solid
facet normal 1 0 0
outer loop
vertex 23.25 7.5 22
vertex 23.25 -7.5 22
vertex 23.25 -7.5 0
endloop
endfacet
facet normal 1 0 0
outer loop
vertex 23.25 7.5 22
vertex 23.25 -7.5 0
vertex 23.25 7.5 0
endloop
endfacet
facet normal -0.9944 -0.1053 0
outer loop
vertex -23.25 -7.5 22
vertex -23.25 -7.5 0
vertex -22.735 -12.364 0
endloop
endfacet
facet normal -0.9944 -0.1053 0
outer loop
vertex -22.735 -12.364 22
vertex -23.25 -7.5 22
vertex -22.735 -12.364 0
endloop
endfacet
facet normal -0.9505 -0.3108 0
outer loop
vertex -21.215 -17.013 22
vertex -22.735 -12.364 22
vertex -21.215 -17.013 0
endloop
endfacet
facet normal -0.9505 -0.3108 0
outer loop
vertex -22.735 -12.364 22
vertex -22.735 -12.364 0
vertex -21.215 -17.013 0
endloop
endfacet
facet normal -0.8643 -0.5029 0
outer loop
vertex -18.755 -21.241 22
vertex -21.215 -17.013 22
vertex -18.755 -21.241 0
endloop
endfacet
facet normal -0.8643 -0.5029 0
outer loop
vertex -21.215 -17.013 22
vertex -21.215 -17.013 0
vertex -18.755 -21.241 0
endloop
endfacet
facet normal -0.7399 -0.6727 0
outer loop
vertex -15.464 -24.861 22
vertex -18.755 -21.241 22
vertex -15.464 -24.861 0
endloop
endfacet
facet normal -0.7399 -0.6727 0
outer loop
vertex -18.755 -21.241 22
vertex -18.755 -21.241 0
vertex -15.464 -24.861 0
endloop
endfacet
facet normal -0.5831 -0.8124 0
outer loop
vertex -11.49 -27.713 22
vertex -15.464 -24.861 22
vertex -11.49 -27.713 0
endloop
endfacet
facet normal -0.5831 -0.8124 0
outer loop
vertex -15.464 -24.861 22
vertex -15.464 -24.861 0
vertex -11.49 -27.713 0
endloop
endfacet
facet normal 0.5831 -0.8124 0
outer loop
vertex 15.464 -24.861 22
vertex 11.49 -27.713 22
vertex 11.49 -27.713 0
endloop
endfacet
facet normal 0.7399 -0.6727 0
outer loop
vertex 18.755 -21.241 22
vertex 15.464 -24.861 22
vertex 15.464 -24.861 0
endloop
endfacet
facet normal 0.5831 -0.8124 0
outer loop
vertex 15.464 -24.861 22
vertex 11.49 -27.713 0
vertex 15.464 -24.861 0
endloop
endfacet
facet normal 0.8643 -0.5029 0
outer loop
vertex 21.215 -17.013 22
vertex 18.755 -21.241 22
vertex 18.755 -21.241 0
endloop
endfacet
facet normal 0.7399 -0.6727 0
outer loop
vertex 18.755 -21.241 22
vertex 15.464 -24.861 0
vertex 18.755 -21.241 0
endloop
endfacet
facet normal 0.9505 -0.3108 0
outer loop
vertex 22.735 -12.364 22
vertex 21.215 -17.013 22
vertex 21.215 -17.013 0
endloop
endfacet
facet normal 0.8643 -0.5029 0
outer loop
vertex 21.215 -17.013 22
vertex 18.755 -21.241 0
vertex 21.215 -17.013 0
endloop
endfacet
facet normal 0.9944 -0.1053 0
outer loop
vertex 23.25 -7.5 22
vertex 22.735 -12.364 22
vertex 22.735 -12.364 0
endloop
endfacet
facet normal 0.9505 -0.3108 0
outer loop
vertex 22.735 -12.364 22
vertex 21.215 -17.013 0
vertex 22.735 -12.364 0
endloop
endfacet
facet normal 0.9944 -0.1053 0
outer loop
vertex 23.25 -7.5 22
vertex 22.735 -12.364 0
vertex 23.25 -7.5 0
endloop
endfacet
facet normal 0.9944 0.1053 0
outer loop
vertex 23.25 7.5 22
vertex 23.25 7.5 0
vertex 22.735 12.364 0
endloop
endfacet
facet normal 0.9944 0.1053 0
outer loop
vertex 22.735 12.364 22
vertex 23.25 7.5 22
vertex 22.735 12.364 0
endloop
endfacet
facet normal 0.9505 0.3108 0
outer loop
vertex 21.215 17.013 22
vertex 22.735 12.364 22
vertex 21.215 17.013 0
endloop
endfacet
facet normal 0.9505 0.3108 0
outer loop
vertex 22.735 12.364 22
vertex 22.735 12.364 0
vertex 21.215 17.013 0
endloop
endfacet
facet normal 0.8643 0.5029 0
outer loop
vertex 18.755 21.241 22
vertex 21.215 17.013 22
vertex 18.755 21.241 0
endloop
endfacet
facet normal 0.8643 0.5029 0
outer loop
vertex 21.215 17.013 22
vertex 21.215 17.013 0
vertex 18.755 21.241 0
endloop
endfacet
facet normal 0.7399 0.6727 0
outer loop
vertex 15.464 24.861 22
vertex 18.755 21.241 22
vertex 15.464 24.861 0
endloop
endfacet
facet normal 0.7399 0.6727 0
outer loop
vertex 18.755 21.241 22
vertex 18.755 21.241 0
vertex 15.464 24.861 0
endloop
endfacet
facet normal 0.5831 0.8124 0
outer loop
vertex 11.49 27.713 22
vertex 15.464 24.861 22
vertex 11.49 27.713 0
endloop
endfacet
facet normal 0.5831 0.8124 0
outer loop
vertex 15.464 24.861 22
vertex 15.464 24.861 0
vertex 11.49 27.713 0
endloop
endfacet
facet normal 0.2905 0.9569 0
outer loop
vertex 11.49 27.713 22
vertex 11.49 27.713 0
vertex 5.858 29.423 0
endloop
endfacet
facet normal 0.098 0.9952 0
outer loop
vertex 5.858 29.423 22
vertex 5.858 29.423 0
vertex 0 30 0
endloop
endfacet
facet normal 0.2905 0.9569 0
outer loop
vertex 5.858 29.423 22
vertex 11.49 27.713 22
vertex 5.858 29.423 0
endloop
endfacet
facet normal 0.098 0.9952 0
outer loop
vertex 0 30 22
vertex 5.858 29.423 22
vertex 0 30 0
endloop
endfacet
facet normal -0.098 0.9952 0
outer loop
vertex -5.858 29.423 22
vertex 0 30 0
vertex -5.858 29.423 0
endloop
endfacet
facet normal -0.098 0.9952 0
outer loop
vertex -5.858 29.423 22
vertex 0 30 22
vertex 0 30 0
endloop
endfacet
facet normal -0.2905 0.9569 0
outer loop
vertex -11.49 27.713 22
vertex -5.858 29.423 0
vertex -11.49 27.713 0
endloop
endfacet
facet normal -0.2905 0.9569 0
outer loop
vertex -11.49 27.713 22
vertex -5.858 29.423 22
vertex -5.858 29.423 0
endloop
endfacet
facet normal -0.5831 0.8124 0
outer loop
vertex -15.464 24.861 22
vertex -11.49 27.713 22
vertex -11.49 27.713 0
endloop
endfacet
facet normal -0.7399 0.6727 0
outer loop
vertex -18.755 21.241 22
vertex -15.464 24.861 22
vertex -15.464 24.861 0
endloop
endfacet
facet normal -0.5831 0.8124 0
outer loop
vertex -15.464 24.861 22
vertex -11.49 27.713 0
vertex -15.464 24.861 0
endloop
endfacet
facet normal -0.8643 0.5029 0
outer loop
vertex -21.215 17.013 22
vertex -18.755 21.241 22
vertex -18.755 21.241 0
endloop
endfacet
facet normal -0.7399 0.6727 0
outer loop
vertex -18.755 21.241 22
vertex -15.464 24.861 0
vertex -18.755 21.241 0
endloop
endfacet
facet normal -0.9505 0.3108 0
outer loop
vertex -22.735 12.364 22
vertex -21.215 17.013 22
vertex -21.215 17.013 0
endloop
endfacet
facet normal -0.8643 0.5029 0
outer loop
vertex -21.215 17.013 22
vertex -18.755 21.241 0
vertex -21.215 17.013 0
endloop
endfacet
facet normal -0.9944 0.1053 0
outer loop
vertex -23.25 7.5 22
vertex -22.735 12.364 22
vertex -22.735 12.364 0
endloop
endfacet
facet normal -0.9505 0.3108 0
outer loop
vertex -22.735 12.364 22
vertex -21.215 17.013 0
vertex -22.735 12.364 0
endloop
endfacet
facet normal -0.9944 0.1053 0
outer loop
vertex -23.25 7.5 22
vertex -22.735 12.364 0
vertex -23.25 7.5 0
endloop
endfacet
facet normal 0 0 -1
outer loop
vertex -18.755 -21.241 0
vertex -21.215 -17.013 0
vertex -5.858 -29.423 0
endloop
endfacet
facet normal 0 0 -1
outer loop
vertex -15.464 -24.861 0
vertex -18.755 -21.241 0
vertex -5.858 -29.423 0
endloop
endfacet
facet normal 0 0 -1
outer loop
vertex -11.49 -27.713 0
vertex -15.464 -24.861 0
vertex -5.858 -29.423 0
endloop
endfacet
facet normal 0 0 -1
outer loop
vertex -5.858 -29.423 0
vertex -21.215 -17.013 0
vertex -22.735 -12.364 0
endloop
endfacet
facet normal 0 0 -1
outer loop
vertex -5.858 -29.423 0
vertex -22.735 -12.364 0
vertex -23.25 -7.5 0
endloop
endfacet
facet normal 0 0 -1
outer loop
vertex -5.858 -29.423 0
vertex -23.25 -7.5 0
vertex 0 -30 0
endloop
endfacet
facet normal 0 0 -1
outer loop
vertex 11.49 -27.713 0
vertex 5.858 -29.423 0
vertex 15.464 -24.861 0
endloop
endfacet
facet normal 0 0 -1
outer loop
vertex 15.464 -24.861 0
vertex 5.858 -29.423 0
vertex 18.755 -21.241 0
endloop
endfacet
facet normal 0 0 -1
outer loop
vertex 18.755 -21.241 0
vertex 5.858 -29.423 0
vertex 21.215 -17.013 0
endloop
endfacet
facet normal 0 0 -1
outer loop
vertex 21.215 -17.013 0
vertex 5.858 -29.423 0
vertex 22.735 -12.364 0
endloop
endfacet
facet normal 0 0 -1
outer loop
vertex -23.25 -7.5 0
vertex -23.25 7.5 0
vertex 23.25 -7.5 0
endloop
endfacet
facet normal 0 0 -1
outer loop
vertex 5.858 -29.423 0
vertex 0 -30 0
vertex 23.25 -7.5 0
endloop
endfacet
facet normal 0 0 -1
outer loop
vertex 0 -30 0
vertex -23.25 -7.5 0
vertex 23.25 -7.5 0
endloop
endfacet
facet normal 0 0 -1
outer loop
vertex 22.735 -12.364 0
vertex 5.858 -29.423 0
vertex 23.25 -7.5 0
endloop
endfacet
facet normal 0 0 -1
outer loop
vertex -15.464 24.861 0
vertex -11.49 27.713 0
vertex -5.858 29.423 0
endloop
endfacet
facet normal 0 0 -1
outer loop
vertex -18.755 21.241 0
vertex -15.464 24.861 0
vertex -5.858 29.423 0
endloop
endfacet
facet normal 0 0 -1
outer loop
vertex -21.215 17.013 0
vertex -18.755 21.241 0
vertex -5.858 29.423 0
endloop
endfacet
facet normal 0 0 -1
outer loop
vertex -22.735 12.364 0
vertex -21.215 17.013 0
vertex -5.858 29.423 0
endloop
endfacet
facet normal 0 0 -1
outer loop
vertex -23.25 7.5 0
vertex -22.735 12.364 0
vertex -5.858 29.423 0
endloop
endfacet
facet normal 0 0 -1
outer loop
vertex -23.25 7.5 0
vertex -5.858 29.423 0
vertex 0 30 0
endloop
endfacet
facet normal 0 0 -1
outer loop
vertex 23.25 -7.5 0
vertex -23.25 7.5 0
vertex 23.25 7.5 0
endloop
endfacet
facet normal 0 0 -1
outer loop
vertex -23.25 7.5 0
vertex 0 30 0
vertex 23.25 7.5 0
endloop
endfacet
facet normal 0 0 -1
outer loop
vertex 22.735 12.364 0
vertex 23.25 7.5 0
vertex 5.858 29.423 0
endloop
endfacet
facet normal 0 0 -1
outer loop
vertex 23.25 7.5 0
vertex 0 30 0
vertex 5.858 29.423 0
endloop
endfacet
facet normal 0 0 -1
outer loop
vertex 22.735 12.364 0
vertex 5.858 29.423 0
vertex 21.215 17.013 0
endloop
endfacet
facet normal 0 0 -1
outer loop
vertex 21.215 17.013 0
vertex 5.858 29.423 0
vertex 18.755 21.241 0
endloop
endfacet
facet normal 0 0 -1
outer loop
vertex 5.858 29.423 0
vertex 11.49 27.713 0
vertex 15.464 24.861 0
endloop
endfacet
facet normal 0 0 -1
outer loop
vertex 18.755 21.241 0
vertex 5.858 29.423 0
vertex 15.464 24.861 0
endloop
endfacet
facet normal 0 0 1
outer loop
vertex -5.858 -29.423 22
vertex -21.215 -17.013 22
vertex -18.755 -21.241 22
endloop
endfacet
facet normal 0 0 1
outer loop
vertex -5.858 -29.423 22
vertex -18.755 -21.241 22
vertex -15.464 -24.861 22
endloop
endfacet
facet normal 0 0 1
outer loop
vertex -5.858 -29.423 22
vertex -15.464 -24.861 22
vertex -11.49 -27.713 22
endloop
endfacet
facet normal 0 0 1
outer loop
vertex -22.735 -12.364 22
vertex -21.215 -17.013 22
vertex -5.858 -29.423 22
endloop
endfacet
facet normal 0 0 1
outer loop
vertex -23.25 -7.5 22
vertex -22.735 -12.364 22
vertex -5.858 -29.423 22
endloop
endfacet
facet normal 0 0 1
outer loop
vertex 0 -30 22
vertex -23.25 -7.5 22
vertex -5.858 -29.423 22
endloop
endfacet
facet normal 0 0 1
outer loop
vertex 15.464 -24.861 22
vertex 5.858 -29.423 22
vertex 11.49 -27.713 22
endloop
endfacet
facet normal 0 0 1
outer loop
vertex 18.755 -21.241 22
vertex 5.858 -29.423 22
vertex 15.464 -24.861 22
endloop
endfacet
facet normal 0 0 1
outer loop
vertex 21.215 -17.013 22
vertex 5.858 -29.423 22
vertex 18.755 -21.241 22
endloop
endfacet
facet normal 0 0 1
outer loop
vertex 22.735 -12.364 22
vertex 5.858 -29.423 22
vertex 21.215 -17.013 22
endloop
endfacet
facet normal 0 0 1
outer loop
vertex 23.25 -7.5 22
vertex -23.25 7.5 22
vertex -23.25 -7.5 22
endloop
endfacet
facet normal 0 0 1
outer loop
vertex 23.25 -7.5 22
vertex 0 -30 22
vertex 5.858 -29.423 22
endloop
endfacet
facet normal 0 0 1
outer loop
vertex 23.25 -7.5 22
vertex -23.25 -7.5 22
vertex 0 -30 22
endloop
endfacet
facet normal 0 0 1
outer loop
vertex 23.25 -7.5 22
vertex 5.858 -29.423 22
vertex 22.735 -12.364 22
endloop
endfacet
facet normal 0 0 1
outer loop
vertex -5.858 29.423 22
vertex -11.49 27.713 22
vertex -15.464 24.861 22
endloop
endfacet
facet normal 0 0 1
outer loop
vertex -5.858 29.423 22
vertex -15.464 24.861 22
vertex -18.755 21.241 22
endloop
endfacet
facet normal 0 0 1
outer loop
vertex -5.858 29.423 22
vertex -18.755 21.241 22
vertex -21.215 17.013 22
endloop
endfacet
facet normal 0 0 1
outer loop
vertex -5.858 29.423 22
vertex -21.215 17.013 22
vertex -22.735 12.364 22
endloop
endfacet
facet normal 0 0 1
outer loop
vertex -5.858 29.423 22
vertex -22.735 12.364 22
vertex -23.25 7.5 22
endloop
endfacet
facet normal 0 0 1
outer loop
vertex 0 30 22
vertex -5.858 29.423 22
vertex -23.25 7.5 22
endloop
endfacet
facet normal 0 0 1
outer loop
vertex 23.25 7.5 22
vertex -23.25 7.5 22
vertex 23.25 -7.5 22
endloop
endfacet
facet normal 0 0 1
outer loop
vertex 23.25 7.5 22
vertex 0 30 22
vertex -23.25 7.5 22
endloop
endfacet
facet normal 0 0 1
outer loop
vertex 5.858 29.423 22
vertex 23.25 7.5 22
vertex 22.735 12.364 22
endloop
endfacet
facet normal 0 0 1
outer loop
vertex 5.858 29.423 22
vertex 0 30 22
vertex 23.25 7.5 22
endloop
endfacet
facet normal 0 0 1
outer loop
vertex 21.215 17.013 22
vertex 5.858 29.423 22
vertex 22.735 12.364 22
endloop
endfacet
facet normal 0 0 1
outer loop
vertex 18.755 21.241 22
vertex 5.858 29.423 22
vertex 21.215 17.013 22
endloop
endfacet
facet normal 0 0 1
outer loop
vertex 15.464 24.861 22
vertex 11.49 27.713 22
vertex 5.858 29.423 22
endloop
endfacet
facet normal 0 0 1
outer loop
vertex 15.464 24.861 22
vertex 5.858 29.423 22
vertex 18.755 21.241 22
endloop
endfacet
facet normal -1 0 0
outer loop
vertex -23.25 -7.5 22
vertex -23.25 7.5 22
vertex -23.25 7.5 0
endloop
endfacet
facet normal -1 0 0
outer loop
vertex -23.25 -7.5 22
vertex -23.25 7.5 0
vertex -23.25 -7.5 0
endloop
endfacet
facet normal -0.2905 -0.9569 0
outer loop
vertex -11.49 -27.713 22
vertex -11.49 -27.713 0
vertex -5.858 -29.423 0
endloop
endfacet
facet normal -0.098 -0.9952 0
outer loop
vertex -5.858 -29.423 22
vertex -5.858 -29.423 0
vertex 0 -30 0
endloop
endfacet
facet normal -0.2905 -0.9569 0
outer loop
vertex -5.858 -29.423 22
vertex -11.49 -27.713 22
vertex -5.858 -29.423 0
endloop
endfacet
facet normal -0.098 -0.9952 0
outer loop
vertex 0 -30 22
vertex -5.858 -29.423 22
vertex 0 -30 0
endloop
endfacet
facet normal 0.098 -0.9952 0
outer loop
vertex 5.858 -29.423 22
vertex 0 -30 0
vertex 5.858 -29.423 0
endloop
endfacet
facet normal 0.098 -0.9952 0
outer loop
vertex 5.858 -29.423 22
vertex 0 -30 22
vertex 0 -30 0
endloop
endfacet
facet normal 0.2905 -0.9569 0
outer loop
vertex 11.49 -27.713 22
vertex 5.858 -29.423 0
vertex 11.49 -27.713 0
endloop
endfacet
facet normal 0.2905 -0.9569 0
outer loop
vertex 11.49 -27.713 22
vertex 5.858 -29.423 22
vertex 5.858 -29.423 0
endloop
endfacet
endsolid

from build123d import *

# Parameters (mm, degrees)
F3_DEPTH = 22
F4_R     = 30
F5_DEPTH = 25


with BuildPart() as f3:
    # F2 (on Top) → F3 (new body)
    with BuildSketch(Plane.XY):
        with BuildLine():
            Line((23.25, -7.5), (23.25, 7.5))
            ThreePointArc((23.25, 7.5), (0, 30.75), (-23.25, 7.5))
            Line((-23.25, 7.5), (-23.25, -7.5))
            ThreePointArc((-23.25, -7.5), (0, -30.75), (23.25, -7.5))
        make_face()
    extrude(amount=F3_DEPTH)


with BuildPart() as f5:
    # F4 (on face) → F5 (new body)
    with BuildSketch(Plane.XY.offset(22)):
        Circle(F4_R)
    extrude(amount=-F5_DEPTH)

    # F6: intersect F3
    add(f3.part, mode=Mode.INTERSECT)


solid = f5.part
